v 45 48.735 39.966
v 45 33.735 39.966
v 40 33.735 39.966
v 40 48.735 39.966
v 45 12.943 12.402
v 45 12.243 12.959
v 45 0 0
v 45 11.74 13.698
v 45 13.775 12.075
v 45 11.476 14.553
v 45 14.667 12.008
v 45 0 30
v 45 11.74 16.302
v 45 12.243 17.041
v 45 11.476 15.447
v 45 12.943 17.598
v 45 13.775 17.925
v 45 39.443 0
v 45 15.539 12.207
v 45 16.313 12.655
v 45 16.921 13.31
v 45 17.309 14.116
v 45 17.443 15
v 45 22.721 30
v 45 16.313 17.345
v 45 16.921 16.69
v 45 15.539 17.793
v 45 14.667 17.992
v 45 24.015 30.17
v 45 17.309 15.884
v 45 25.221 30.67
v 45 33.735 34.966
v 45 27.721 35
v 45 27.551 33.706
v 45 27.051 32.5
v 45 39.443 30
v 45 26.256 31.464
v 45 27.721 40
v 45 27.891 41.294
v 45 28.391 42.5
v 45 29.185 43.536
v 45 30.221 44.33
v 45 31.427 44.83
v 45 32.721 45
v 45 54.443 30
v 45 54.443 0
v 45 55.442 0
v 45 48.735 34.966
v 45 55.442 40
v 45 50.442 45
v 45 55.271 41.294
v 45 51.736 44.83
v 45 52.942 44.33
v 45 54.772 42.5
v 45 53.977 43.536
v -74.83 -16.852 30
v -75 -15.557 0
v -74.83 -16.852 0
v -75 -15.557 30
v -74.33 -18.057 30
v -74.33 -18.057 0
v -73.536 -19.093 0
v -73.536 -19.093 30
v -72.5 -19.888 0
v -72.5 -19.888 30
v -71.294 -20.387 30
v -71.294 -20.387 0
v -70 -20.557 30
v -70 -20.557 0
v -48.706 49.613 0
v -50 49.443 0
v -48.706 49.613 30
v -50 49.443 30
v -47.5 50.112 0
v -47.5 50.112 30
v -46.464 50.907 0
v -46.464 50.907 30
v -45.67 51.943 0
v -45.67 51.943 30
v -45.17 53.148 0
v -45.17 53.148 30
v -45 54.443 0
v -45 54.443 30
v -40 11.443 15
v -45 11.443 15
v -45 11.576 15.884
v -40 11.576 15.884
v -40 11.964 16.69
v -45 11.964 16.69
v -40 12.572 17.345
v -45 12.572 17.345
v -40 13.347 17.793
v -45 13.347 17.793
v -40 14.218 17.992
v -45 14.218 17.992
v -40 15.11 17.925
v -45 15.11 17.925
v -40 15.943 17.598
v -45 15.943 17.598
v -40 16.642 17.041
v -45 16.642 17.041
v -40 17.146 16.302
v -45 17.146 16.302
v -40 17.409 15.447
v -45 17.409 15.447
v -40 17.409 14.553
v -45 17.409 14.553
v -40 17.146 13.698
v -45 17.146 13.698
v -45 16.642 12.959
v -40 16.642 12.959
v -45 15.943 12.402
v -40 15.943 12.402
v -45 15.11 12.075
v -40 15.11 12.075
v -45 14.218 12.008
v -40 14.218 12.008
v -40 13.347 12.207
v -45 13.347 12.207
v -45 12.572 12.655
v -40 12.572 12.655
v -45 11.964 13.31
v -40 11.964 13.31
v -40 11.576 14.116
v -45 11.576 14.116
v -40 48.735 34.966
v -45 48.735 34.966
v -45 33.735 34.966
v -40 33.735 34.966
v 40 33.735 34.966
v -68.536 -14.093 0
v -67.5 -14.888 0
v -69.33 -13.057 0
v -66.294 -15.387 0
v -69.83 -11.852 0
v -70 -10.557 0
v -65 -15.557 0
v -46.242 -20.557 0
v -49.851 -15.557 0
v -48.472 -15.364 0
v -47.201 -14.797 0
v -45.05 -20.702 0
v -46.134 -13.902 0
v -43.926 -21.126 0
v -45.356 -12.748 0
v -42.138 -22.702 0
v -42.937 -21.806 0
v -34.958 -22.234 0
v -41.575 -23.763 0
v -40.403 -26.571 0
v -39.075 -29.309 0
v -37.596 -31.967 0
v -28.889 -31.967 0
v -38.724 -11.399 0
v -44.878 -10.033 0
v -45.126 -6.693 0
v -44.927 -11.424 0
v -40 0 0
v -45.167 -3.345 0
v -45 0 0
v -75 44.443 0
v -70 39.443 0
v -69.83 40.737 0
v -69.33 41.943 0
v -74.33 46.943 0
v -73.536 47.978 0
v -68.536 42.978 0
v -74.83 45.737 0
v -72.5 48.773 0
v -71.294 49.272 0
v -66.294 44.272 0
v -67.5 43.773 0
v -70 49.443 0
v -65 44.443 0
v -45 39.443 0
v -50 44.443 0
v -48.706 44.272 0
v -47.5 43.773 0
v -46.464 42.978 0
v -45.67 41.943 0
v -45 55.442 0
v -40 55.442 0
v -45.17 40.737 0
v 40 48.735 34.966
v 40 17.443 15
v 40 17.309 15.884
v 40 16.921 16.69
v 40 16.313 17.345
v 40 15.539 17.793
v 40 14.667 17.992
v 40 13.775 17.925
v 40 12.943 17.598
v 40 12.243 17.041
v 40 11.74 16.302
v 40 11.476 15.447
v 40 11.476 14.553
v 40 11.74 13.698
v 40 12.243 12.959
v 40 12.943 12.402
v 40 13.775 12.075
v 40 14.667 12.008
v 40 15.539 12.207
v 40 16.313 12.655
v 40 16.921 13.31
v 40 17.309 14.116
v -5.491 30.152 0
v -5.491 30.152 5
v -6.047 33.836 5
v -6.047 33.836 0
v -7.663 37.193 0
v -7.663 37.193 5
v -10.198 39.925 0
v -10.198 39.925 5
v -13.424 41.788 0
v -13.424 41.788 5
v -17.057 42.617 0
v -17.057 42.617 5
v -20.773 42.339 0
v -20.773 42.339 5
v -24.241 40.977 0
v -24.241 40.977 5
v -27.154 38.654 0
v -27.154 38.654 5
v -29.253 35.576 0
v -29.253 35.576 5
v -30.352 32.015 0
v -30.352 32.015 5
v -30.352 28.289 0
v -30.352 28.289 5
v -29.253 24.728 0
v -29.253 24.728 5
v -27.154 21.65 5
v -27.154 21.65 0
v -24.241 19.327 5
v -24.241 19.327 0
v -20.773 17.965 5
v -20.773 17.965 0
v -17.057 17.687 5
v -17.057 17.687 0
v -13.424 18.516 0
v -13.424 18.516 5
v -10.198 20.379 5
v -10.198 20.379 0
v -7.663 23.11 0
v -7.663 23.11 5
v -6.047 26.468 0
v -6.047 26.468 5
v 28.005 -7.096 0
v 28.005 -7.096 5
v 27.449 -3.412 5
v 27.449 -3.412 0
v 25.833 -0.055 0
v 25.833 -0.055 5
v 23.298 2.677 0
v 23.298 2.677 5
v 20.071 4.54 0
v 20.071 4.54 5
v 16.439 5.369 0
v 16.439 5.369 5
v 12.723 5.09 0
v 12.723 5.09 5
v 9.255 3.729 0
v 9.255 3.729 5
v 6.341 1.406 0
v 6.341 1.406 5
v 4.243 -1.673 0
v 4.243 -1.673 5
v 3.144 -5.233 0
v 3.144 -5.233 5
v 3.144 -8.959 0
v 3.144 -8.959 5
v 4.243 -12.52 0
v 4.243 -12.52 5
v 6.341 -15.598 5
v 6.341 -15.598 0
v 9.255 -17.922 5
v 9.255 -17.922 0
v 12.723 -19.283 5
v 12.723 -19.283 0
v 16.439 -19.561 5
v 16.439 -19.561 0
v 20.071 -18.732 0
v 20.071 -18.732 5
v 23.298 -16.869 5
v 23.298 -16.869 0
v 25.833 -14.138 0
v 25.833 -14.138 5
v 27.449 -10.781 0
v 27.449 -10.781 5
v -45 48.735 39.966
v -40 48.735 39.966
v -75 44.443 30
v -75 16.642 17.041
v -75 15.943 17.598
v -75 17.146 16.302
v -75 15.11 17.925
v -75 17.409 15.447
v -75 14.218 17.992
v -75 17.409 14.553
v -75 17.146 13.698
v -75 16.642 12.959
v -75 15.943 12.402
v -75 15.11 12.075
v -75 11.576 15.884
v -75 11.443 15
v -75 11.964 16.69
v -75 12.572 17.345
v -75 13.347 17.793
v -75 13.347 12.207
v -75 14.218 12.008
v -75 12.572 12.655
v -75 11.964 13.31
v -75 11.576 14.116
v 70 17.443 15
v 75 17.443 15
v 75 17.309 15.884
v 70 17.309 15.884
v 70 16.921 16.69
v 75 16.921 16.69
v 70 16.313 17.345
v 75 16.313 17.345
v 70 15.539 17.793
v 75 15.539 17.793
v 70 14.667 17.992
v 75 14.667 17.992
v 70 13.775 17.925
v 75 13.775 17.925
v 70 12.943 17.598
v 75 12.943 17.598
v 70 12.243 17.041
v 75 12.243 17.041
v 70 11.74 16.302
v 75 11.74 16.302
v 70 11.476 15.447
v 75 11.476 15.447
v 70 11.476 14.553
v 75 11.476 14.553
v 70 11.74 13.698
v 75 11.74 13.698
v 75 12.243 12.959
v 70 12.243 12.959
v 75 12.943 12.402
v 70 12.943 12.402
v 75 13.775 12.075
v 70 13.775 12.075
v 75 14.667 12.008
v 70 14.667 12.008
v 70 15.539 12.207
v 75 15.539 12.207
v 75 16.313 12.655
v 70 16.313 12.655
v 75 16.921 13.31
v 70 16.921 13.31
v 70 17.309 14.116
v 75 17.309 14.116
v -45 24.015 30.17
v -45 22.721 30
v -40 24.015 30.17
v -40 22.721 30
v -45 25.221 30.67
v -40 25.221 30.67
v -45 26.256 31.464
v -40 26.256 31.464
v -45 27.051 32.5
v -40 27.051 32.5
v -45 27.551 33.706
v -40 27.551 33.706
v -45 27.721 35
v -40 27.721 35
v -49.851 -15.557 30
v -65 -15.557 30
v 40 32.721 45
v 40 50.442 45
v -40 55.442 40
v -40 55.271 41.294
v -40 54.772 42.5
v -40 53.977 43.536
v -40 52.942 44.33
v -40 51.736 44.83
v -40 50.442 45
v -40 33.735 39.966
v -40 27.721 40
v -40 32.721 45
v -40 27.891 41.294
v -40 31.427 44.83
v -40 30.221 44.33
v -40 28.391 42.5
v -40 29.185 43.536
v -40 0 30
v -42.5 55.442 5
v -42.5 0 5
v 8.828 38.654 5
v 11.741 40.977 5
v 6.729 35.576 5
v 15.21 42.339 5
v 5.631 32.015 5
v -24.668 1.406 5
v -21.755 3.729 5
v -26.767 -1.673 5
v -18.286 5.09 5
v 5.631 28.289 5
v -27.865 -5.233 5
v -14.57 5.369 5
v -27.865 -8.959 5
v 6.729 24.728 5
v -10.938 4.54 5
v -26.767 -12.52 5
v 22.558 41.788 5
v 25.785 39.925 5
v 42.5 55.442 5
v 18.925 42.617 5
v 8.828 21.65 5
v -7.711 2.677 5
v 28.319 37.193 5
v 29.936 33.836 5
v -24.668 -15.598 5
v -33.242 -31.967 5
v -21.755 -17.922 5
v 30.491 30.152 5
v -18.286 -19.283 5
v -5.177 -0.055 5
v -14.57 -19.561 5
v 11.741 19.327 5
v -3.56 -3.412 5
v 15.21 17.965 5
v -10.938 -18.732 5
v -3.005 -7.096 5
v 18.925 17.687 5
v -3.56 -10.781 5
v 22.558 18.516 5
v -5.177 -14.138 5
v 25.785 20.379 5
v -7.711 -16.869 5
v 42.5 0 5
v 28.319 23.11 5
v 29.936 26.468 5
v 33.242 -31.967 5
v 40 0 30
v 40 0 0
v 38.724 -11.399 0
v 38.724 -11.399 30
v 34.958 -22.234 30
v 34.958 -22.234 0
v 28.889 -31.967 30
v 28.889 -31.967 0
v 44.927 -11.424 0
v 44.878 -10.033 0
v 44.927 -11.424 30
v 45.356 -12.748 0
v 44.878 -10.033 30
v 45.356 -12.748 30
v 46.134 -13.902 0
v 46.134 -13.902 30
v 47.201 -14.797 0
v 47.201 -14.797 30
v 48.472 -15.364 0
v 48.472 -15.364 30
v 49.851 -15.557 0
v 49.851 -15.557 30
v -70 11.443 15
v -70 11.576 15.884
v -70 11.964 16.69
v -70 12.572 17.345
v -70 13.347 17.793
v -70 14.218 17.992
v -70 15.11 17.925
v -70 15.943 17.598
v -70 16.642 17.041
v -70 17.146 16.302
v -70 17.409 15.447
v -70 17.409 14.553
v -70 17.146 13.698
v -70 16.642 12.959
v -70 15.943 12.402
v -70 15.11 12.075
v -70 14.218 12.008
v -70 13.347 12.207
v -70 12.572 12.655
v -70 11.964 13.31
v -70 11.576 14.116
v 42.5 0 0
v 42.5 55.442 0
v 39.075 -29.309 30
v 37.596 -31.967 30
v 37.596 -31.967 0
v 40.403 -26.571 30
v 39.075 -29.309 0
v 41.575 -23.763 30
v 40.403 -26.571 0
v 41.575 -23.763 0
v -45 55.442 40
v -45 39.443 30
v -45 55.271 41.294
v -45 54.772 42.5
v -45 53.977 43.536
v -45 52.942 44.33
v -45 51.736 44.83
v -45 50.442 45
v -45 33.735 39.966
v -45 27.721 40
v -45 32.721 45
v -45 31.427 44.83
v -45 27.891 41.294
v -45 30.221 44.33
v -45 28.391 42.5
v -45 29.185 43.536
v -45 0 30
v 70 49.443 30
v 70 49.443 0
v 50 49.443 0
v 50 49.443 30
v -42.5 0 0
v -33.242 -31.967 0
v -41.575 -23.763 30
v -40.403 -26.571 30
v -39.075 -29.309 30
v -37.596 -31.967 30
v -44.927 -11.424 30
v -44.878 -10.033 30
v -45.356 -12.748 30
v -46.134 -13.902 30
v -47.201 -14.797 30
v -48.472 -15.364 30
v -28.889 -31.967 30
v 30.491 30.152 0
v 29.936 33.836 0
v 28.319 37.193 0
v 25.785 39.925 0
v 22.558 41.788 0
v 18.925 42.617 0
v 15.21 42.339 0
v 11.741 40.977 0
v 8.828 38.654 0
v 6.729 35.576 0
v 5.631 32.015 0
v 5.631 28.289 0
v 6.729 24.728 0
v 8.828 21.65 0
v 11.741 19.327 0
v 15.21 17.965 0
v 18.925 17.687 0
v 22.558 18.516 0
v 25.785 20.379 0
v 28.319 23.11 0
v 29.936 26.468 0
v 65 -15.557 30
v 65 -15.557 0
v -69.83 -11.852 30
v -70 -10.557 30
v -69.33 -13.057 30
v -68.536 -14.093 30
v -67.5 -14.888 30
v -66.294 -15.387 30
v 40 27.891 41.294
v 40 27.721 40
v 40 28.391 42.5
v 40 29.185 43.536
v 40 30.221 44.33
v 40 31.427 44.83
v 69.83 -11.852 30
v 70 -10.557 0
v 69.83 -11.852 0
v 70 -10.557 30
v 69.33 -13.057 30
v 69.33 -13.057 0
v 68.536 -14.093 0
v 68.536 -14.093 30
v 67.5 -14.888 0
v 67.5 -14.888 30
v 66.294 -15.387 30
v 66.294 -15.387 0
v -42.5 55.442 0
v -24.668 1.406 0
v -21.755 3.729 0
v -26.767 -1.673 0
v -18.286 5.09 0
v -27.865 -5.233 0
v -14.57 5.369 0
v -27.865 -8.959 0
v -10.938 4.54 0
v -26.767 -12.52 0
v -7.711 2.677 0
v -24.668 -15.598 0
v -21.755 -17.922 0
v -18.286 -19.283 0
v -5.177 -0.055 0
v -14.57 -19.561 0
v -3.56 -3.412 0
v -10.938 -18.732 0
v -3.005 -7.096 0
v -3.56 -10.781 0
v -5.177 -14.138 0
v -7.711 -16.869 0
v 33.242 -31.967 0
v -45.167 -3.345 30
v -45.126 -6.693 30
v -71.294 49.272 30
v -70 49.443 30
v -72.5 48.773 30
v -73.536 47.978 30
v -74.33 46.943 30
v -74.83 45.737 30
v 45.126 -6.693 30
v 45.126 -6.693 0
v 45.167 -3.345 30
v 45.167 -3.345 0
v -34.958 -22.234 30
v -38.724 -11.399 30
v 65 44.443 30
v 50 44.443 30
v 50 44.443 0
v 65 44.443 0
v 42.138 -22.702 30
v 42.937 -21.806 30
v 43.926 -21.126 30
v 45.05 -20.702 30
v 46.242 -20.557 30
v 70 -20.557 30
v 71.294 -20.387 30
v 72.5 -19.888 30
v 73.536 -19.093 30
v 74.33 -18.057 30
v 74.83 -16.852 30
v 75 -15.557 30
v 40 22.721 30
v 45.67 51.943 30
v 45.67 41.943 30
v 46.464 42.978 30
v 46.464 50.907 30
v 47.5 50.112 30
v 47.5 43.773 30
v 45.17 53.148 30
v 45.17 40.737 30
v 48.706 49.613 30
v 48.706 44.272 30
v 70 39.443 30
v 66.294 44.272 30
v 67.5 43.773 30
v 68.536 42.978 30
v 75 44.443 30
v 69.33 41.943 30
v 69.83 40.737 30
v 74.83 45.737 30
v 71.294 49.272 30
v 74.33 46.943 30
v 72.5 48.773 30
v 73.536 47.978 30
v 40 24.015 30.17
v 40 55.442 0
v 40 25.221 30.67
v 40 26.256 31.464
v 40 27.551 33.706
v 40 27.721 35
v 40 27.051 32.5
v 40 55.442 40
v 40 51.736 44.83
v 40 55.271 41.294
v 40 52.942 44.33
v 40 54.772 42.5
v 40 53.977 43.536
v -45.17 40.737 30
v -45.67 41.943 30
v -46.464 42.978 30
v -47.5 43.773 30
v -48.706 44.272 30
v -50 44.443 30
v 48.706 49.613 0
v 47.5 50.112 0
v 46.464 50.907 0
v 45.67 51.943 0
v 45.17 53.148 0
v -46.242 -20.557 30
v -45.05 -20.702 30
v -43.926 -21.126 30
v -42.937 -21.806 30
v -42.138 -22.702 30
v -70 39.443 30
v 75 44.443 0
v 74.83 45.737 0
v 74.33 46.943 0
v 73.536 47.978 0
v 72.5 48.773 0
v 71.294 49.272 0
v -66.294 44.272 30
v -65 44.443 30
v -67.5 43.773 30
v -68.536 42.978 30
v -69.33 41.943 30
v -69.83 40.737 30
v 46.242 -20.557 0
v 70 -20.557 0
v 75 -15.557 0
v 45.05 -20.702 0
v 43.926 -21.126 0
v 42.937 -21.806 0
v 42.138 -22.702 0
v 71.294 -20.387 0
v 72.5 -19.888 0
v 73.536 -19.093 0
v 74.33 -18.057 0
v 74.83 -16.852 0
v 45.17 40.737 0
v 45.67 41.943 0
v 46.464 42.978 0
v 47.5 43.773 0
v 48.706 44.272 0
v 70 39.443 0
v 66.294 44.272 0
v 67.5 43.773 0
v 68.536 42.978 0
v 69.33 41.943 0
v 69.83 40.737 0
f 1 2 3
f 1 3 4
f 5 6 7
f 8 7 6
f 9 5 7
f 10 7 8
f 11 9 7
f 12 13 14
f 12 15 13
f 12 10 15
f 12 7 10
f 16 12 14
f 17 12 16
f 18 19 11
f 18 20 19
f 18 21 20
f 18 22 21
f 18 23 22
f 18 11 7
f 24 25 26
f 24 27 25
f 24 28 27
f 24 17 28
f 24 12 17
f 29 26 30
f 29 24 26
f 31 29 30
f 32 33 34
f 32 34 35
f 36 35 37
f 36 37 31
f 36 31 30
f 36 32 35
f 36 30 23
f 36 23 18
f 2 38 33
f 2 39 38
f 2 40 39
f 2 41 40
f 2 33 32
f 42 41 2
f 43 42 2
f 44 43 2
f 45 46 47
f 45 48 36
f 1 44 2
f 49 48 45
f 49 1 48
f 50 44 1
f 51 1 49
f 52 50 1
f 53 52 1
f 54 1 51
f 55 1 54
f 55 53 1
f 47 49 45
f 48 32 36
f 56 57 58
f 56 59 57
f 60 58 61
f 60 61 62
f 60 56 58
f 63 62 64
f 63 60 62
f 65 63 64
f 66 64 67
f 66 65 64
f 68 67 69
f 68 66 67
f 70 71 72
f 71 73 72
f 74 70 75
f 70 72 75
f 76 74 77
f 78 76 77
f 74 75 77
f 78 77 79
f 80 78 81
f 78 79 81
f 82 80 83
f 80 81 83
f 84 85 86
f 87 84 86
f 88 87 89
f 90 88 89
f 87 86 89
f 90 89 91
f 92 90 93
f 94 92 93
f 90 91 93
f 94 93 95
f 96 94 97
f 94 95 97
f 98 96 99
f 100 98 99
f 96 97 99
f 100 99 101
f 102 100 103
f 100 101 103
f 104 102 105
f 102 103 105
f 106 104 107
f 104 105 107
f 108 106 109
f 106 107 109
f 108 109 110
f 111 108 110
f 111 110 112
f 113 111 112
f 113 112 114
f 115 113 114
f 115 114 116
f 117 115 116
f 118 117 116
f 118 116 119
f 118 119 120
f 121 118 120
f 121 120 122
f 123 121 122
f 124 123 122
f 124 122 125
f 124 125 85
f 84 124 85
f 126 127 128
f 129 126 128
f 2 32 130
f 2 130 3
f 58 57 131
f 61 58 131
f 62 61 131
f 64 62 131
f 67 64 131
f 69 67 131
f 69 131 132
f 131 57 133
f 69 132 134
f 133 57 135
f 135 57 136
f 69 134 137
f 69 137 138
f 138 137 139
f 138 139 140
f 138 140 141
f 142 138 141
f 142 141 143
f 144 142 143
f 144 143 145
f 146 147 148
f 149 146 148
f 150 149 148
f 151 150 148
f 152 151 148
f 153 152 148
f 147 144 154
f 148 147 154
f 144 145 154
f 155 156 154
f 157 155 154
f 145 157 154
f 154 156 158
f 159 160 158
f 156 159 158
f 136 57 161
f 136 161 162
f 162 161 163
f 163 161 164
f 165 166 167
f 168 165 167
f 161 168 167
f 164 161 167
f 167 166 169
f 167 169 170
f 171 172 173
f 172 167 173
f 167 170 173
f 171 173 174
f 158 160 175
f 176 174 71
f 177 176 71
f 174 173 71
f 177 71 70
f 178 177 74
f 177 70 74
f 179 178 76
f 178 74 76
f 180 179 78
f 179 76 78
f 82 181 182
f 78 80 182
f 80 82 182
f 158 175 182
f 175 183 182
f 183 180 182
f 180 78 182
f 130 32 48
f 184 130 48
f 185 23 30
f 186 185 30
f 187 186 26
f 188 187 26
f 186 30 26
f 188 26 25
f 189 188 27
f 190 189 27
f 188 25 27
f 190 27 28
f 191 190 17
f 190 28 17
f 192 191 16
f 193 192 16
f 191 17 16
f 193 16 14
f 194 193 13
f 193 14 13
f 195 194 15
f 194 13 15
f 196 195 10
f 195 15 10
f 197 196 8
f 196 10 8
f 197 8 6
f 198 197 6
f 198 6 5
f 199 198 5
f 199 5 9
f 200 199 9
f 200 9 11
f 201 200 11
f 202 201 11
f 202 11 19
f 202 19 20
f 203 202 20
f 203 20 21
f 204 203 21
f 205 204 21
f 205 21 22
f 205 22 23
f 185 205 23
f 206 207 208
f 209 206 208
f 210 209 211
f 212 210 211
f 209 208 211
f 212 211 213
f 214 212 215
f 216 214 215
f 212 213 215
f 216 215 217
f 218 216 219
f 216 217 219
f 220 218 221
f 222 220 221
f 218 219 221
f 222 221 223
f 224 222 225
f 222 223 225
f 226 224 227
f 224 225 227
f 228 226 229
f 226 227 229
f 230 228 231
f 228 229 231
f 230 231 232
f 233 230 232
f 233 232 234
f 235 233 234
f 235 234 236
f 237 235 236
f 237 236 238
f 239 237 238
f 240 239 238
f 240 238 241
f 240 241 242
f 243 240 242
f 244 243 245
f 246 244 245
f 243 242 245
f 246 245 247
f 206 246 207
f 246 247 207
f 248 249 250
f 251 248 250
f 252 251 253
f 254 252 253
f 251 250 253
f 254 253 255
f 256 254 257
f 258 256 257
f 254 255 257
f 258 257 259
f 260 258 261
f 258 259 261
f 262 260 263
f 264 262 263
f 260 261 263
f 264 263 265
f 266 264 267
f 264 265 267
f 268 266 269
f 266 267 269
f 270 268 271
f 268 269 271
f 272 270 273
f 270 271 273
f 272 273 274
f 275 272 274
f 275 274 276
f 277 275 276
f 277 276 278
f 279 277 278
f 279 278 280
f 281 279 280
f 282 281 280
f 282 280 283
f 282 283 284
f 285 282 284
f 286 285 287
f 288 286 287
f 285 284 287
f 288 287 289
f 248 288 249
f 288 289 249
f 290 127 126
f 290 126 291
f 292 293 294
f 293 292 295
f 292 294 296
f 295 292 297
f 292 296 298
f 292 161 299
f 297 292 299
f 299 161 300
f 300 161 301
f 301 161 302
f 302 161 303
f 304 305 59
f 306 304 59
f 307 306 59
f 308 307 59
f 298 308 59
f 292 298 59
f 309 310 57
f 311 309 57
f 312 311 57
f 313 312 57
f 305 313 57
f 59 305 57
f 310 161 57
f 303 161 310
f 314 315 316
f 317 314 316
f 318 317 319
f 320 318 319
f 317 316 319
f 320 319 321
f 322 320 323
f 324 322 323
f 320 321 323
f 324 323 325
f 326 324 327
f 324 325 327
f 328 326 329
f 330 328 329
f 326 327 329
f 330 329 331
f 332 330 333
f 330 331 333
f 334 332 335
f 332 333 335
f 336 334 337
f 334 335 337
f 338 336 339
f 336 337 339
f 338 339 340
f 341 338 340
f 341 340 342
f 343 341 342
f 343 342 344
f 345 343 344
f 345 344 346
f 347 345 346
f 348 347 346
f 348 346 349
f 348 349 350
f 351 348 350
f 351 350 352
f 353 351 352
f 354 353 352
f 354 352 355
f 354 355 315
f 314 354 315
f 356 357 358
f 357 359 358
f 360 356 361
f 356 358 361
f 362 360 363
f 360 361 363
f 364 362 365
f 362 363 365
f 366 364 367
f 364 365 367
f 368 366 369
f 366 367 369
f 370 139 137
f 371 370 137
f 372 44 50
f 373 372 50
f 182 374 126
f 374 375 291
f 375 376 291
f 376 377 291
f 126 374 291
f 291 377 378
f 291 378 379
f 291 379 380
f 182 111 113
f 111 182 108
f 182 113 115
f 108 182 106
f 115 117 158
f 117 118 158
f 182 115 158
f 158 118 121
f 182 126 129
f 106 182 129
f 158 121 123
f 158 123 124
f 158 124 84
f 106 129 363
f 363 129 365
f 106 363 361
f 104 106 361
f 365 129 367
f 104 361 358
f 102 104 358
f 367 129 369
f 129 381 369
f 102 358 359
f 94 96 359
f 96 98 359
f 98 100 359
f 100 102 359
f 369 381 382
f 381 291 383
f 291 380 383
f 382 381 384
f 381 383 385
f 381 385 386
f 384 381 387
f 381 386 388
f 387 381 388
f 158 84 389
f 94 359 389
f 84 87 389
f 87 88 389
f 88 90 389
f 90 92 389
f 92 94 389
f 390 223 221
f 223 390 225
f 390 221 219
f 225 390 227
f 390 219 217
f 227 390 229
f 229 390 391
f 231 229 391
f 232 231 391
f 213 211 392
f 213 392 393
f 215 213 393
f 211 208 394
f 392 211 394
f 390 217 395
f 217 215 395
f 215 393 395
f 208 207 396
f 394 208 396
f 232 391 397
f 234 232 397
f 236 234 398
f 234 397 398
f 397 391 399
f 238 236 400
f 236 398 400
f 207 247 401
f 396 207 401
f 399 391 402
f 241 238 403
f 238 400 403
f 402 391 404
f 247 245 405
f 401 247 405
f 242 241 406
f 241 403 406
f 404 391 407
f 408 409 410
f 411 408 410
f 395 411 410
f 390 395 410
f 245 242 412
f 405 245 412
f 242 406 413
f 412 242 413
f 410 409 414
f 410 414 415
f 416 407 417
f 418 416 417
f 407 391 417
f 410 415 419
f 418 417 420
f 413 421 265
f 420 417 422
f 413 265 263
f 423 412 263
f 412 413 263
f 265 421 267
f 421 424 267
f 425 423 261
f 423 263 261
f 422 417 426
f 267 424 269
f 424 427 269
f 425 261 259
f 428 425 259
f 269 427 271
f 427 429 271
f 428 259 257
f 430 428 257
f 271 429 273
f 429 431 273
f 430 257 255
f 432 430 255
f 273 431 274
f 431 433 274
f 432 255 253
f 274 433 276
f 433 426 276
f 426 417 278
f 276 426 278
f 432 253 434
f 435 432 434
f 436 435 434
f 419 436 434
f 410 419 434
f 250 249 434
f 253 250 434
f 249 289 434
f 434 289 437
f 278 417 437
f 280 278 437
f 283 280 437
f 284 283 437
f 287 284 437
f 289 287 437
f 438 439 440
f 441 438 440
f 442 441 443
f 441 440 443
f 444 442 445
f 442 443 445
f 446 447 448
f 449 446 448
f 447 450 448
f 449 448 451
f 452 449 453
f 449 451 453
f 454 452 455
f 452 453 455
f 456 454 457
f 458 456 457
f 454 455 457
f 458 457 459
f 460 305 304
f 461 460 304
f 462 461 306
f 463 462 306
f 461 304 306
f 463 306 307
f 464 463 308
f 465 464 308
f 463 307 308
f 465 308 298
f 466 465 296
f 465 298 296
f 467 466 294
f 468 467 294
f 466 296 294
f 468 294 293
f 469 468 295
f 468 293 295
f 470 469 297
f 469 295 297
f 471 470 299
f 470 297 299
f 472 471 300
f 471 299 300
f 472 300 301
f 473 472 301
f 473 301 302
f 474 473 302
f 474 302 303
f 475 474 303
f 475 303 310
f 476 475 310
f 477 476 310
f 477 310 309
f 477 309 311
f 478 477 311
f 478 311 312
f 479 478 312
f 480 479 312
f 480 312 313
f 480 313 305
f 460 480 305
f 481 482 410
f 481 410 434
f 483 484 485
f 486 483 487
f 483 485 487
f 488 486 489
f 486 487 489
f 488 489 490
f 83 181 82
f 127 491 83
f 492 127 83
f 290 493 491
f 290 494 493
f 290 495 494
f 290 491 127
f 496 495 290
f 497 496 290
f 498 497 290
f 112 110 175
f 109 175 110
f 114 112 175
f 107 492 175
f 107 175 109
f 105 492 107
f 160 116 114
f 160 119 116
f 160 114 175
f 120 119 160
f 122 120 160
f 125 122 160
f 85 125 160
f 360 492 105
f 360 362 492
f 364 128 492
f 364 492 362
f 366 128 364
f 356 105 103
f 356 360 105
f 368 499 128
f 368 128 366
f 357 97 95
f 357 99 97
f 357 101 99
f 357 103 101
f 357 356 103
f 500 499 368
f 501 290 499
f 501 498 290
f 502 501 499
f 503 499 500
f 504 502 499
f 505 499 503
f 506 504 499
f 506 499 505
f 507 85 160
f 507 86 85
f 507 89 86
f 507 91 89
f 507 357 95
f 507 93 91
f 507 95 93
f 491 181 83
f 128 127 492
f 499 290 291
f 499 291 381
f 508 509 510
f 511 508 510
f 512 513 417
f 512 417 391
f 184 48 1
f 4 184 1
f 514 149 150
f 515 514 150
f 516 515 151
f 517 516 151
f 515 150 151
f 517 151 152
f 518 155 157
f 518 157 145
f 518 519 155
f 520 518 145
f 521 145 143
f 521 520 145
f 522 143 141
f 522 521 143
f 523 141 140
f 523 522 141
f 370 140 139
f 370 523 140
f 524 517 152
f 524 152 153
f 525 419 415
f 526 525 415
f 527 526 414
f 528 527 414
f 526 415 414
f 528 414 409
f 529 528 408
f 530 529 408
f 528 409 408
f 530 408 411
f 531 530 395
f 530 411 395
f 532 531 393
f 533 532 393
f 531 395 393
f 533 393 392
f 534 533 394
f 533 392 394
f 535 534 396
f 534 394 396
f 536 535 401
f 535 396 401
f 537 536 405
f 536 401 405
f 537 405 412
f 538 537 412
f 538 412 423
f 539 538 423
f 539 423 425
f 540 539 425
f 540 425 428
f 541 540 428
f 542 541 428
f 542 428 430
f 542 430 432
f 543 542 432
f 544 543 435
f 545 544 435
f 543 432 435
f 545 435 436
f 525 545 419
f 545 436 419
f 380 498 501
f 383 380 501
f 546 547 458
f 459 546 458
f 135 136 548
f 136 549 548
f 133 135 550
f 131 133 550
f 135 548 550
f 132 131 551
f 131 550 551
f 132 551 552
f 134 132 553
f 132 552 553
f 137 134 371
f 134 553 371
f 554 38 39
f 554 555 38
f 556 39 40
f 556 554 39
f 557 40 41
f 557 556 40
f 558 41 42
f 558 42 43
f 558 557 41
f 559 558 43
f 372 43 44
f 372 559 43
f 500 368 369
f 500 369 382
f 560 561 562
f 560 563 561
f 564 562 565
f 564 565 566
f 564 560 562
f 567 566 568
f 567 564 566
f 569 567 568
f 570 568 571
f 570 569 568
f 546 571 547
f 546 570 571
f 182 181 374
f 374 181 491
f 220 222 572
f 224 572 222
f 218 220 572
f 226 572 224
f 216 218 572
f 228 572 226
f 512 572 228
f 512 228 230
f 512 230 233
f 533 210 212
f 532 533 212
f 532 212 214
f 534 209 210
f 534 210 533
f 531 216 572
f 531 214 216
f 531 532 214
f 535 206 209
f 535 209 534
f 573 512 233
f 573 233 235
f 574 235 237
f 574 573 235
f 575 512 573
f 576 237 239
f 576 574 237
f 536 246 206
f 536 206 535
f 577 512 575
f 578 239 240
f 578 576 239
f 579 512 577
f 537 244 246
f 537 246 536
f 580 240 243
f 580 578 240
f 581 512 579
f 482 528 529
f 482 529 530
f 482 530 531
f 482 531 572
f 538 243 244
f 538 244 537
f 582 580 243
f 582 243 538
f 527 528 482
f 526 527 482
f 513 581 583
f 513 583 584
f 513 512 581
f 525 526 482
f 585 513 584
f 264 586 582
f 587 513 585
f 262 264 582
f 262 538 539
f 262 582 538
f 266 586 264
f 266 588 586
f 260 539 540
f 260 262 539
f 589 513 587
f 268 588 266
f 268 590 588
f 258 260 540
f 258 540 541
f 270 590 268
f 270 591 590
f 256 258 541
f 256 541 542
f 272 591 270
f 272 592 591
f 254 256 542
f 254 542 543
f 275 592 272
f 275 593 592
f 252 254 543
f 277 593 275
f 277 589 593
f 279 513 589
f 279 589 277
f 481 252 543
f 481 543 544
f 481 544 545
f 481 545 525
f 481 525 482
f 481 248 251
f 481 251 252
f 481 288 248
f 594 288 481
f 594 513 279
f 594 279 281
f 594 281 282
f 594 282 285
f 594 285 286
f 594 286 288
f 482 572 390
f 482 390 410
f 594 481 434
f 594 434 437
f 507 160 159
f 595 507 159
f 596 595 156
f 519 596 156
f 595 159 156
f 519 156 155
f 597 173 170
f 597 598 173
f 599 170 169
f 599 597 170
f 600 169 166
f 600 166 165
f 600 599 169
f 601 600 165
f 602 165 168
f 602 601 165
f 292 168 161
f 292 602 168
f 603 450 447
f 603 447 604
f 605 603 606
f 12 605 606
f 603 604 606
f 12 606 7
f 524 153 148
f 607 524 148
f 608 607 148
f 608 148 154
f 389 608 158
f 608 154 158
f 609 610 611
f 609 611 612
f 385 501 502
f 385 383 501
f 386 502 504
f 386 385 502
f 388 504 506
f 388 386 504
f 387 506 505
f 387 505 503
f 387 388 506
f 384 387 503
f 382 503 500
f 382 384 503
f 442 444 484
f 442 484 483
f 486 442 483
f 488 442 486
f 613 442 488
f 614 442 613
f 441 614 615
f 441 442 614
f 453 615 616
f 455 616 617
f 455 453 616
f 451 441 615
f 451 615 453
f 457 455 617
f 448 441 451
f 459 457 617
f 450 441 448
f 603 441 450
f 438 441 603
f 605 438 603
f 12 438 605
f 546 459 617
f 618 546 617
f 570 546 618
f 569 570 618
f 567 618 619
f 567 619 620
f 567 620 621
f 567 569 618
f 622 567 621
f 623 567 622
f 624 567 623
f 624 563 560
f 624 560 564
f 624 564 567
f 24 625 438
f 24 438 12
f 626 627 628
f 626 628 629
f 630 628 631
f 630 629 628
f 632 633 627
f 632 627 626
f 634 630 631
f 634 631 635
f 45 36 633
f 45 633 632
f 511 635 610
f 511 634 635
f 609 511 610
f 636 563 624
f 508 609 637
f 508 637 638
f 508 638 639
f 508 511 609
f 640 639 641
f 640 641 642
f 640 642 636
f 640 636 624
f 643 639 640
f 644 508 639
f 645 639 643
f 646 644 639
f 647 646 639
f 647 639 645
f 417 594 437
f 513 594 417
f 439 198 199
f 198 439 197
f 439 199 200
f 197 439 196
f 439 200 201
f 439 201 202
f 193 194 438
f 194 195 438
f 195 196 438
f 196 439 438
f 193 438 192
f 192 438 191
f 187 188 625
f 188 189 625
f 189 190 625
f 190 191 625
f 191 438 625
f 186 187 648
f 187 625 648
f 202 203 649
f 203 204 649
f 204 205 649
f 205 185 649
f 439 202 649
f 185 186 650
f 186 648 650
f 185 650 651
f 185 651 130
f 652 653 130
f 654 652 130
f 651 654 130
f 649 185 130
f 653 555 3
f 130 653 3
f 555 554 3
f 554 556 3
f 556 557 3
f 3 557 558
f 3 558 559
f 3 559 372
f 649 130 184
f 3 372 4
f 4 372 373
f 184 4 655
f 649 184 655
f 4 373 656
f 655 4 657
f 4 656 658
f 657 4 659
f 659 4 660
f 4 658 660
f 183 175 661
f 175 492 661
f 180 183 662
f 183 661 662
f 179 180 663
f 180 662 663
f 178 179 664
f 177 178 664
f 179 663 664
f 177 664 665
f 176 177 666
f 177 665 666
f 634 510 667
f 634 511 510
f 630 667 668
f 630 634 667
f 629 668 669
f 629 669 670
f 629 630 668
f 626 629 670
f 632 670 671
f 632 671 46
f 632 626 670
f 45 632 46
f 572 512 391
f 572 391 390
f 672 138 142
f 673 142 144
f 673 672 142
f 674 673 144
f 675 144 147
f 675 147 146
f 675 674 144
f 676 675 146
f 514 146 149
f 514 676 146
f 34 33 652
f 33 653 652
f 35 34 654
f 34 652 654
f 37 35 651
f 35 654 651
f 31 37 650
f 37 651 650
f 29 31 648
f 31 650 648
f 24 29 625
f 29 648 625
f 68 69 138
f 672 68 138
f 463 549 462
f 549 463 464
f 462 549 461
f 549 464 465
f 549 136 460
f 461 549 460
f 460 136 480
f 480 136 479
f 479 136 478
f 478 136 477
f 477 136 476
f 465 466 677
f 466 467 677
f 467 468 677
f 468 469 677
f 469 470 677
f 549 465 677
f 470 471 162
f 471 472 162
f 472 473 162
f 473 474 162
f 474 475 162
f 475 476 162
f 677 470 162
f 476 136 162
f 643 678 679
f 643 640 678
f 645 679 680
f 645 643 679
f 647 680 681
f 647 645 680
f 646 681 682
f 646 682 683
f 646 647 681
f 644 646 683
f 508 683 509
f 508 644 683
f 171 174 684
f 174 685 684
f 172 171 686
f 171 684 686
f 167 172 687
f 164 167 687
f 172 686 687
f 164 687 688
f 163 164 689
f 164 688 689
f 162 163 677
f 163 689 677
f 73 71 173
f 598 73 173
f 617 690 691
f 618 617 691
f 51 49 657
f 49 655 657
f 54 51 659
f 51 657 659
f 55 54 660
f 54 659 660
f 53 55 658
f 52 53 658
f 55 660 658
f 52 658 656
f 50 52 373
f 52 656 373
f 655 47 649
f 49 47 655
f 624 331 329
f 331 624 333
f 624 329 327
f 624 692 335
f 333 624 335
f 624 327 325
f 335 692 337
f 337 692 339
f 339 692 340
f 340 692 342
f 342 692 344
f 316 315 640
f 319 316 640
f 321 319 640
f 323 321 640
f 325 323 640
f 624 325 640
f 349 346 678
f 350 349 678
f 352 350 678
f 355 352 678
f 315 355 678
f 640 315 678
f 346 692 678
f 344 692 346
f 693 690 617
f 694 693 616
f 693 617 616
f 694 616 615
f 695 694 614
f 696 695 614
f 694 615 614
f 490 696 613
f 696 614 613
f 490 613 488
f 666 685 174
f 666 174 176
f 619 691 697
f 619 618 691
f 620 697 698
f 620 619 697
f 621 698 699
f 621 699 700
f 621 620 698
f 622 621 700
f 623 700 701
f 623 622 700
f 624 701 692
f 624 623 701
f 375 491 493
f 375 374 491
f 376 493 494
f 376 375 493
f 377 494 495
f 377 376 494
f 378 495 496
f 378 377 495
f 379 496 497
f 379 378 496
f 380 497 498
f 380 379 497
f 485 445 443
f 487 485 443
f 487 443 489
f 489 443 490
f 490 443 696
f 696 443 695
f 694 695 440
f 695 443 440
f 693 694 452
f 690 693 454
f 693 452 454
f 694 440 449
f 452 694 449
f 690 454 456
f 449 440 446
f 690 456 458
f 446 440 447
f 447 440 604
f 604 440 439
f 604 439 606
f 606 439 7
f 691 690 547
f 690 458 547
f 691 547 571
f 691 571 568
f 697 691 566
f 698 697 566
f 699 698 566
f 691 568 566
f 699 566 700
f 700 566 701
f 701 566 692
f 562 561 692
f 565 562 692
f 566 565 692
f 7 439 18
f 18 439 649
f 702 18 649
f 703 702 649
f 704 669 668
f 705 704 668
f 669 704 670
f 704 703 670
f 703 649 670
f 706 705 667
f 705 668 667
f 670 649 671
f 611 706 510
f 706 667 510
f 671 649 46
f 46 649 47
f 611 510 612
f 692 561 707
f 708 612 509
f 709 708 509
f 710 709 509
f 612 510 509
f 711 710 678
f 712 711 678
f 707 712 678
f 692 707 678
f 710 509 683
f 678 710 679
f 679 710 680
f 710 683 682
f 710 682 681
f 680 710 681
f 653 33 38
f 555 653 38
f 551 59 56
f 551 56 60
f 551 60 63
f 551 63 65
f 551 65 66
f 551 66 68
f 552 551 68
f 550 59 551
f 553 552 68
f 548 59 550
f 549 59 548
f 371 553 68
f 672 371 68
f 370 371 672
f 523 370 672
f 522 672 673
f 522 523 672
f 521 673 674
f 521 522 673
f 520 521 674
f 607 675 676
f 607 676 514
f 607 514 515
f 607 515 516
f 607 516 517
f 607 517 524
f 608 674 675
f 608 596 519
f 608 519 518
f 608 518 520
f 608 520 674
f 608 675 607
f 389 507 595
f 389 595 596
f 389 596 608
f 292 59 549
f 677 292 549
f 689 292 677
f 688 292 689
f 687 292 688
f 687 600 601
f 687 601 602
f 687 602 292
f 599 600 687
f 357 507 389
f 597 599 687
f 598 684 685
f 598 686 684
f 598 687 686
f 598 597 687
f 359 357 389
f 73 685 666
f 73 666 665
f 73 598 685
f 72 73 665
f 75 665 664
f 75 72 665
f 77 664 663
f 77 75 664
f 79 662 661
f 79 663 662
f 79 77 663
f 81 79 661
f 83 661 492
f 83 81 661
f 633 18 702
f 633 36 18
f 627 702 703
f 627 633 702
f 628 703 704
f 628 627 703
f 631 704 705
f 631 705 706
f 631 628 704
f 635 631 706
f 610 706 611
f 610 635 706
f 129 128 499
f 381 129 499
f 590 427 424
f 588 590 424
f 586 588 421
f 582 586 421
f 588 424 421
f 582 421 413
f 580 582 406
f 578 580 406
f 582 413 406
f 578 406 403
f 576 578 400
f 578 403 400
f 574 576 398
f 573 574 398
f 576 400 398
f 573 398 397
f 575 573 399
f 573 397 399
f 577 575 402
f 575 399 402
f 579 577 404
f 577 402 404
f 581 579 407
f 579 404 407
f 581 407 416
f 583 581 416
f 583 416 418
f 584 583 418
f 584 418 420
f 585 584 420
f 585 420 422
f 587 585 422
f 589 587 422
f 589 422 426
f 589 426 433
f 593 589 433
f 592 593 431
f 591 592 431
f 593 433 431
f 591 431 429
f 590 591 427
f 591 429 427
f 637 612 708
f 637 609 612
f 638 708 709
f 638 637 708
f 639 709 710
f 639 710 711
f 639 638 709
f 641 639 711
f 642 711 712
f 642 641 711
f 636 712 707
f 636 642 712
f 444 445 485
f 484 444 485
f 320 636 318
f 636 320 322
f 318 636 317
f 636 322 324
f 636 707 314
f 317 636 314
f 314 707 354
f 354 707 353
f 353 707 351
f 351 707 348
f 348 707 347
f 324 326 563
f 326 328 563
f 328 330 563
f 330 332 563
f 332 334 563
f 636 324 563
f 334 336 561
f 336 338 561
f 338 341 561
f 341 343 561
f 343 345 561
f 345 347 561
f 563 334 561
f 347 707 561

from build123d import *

# Parameters (mm, degrees)
F1_DEPTH  = 30
F3_DEPTH  = 5
F4_R      = 3
F5_DEPTH  = 35
F6_R      = 3
F7_DEPTH  = 35
F9_W      = 27.7209319142
F9_H      = 15
F9_W_2    = 15
F9_H_2    = 5
F10_DEPTH = 5
F11_R     = 5
F12_R     = 5
F13_R     = 5
F13_2_R   = 5
F14_R     = 5
F15_W     = 27.7209319142
F15_H     = 15
F15_W_2   = 15
F15_H_2   = 5
F16_DEPTH = 5
F17_R     = 5
F18_R     = 12.5
F19_DEPTH = 5


with BuildPart() as f1:
    # F0 (on Top) → F1 (new body)
    with BuildSketch(Plane.XY):
        with BuildLine():
            Line((-45, 44.4425949542), (-45, 0))
            ThreePointArc((-45, 0), (-45.066266446, -7.8147796829), (-44.0046991035, -15.5574050458))
            ThreePointArc((-44.0046991035, -15.5574050458), (-43.4089049923, -18.0730910814), (-42.6934813561, -20.5574050458))
            ThreePointArc((-42.6934813561, -20.5574050458), (-40.475443237, -26.4101305765), (-37.5955815851, -31.9671519101))
            Line((-37.5955815851, -31.9671519101), (-28.8889932035, -31.9671519101))
            ThreePointArc((-28.8889932035, -31.9671519101), (-37.1430686541, -16.9215341597), (-40, 0))
            Line((-40, 0), (-40, 55.4418638284))
            Line((-40, 55.4418638284), (-45, 55.4418638284))
            Line((-45, 55.4418638284), (-45, 49.4425949542))
            Line((-45, 49.4425949542), (-45, 44.4425949542))
        make_face()
        with BuildLine():
            ThreePointArc((-42.6934813561, -20.5574050458), (-43.4089049923, -18.0730910814), (-44.0046991035, -15.5574050458))
            Line((-44.0046991035, -15.5574050458), (-70, -15.5574050458))
            Line((-70, -15.5574050458), (-70, 44.4425949542))
            Line((-70, 44.4425949542), (-45, 44.4425949542))
            Line((-45, 44.4425949542), (-45, 49.4425949542))
            Line((-45, 49.4425949542), (-75, 49.4425949542))
            Line((-75, 49.4425949542), (-75, -20.5574050458))
            Line((-75, -20.5574050458), (-42.6934813561, -20.5574050458))
        make_face()
    extrude(amount=F1_DEPTH)

    # F6 (on face) → F7 (cut)
    with BuildSketch(Plane(origin=(-75, 0, 0), x_dir=(0, -1, 0), z_dir=(-1, 0, 0))):
        with Locations((-14.4425949542, 15)):
            Circle(F6_R)
    extrude(amount=-F7_DEPTH, mode=Mode.SUBTRACT)

    # F9 (on face) → F10 (join)
    with BuildSketch(Plane(origin=(-45, 0, 0), x_dir=(0, -1, 0), z_dir=(-1, 0, 0))):
        with Locations((-41.5813978713, 37.5)):
            Rectangle(F9_W, F9_H)
        with Locations((-41.235268414, 37.4656194448)):
            Rectangle(F9_W_2, F9_H_2, mode=Mode.SUBTRACT)
    extrude(amount=-F10_DEPTH)

    # F11
    f11_edges = [f1.edges().sort_by_distance(p)[0] for p in [
        (-75, 49.442595, 15),
        (-75, -20.557405, 15),
    ]]
    fillet(f11_edges, radius=F11_R)

    # F13
    f13_edges = [f1.edges().sort_by_distance(p)[0] for p in [
        (-70, 44.442595, 15),
        (-70, -15.557405, 15),
        (-45, 44.442595, 15),
        (-44.004699, -15.557405, 15),
        (-42.693481, -20.557405, 15),
        (-45, 49.442595, 15),
        (-42.5, 27.720932, 30),
    ]]
    fillet(f13_edges, radius=F13_R)

    # F14
    f14_edges = [f1.edges().sort_by_distance(p)[0] for p in [
        (-42.5, 55.441864, 45),
        (-42.5, 27.720932, 45),
    ]]
    fillet(f14_edges, radius=F14_R)


with BuildPart() as f1b:
    # F0 (on Top) → F1, piece 2 (new body)
    with BuildSketch(Plane.XY):
        with BuildLine():
            ThreePointArc((44.0046991035, -15.5574050458), (45.066266446, -7.8147796829), (45, 0))
            Line((45, 0), (45, 44.4425949542))
            Line((45, 44.4425949542), (45, 49.4425949542))
            Line((45, 49.4425949542), (45, 55.4418638284))
            Line((45, 55.4418638284), (40, 55.4418638284))
            Line((40, 55.4418638284), (40, 0))
            ThreePointArc((40, 0), (37.1430686541, -16.9215341597), (28.8889932035, -31.9671519101))
            Line((28.8889932035, -31.9671519101), (37.5955815851, -31.9671519101))
            ThreePointArc((37.5955815851, -31.9671519101), (40.475443237, -26.4101305765), (42.6934813561, -20.5574050458))
            ThreePointArc((42.6934813561, -20.5574050458), (43.4089049923, -18.0730910814), (44.0046991035, -15.5574050458))
        make_face()
        with BuildLine():
            Line((45, 49.4425949542), (45, 44.4425949542))
            Line((45, 44.4425949542), (70, 44.4425949542))
            Line((70, 44.4425949542), (70, -15.5574050458))
            Line((70, -15.5574050458), (44.0046991035, -15.5574050458))
            ThreePointArc((44.0046991035, -15.5574050458), (43.4089049923, -18.0730910814), (42.6934813561, -20.5574050458))
            Line((42.6934813561, -20.5574050458), (75, -20.5574050458))
            Line((75, -20.5574050458), (75, 49.4425949542))
            Line((75, 49.4425949542), (45, 49.4425949542))
        make_face()
    extrude(amount=F1_DEPTH)

    # F4 (on face) → F5 (cut)
    with BuildSketch(Plane.YZ.offset(75)):
        with Locations((14.4425949542, 15)):
            Circle(F4_R)
    extrude(amount=-F5_DEPTH, mode=Mode.SUBTRACT)

    # F12
    f12_edges = [f1b.edges().sort_by_distance(p)[0] for p in [
        (75, -20.557405, 15),
        (75, 49.442595, 15),
    ]]
    fillet(f12_edges, radius=F12_R)

    # F13#2
    f13_2_edges = [f1b.edges().sort_by_distance(p)[0] for p in [
        (70, 44.442595, 15),
        (70, -15.557405, 15),
        (45, 44.442595, 15),
        (44.004699, -15.557405, 15),
        (42.693481, -20.557405, 15),
        (45, 49.442595, 15),
    ]]
    fillet(f13_2_edges, radius=F13_2_R)

    # F15 (on face) → F16 (join)
    with BuildSketch(Plane.YZ.offset(45)):
        with Locations((41.5813978713, 37.5)):
            Rectangle(F15_W, F15_H)
        with Locations((41.235268414, 37.4656194448)):
            Rectangle(F15_W_2, F15_H_2, mode=Mode.SUBTRACT)
    extrude(amount=-F16_DEPTH)

    # F17
    f17_edges = [f1b.edges().sort_by_distance(p)[0] for p in [
        (42.5, 55.441864, 45),
        (42.5, 27.720932, 45),
        (42.5, 27.720932, 30),
    ]]
    fillet(f17_edges, radius=F17_R)


with BuildPart() as f3:
    # F2 (on face) → F3 (new body)
    with BuildSketch(Plane(origin=(0, 0, 0), x_dir=(1, 0, 0), z_dir=(0, 0, -1))):
        Polygon((-42.5, 0), (-42.5, -55.4418638284), (0, -55.4418638284), (0, 31.9671519101), (-33.2422873943, 31.9671519101), align=None)
        Polygon((0, 31.9671519101), (0, -55.4418638284), (42.5, -55.4418638284), (42.5, 0), (33.2422873943, 31.9671519101), align=None)
    extrude(amount=-F3_DEPTH)

    # F18 (on face) → F19 (cut)
    with BuildSketch(Plane.XY.offset(5)):
        with Locations((-17.9911866391, 30.1519593033)):
            Circle(F18_R)
        with Locations((-15.5046174286, -7.0962243824)):
            Circle(F18_R)
        with Locations((17.9911866391, 30.1519593033)):
            Circle(F18_R)
        with Locations((15.5046174286, -7.0962243824)):
            Circle(F18_R)
    extrude(amount=-F19_DEPTH, mode=Mode.SUBTRACT)


solid = Compound([f1.part, f1b.part, f3.part])
